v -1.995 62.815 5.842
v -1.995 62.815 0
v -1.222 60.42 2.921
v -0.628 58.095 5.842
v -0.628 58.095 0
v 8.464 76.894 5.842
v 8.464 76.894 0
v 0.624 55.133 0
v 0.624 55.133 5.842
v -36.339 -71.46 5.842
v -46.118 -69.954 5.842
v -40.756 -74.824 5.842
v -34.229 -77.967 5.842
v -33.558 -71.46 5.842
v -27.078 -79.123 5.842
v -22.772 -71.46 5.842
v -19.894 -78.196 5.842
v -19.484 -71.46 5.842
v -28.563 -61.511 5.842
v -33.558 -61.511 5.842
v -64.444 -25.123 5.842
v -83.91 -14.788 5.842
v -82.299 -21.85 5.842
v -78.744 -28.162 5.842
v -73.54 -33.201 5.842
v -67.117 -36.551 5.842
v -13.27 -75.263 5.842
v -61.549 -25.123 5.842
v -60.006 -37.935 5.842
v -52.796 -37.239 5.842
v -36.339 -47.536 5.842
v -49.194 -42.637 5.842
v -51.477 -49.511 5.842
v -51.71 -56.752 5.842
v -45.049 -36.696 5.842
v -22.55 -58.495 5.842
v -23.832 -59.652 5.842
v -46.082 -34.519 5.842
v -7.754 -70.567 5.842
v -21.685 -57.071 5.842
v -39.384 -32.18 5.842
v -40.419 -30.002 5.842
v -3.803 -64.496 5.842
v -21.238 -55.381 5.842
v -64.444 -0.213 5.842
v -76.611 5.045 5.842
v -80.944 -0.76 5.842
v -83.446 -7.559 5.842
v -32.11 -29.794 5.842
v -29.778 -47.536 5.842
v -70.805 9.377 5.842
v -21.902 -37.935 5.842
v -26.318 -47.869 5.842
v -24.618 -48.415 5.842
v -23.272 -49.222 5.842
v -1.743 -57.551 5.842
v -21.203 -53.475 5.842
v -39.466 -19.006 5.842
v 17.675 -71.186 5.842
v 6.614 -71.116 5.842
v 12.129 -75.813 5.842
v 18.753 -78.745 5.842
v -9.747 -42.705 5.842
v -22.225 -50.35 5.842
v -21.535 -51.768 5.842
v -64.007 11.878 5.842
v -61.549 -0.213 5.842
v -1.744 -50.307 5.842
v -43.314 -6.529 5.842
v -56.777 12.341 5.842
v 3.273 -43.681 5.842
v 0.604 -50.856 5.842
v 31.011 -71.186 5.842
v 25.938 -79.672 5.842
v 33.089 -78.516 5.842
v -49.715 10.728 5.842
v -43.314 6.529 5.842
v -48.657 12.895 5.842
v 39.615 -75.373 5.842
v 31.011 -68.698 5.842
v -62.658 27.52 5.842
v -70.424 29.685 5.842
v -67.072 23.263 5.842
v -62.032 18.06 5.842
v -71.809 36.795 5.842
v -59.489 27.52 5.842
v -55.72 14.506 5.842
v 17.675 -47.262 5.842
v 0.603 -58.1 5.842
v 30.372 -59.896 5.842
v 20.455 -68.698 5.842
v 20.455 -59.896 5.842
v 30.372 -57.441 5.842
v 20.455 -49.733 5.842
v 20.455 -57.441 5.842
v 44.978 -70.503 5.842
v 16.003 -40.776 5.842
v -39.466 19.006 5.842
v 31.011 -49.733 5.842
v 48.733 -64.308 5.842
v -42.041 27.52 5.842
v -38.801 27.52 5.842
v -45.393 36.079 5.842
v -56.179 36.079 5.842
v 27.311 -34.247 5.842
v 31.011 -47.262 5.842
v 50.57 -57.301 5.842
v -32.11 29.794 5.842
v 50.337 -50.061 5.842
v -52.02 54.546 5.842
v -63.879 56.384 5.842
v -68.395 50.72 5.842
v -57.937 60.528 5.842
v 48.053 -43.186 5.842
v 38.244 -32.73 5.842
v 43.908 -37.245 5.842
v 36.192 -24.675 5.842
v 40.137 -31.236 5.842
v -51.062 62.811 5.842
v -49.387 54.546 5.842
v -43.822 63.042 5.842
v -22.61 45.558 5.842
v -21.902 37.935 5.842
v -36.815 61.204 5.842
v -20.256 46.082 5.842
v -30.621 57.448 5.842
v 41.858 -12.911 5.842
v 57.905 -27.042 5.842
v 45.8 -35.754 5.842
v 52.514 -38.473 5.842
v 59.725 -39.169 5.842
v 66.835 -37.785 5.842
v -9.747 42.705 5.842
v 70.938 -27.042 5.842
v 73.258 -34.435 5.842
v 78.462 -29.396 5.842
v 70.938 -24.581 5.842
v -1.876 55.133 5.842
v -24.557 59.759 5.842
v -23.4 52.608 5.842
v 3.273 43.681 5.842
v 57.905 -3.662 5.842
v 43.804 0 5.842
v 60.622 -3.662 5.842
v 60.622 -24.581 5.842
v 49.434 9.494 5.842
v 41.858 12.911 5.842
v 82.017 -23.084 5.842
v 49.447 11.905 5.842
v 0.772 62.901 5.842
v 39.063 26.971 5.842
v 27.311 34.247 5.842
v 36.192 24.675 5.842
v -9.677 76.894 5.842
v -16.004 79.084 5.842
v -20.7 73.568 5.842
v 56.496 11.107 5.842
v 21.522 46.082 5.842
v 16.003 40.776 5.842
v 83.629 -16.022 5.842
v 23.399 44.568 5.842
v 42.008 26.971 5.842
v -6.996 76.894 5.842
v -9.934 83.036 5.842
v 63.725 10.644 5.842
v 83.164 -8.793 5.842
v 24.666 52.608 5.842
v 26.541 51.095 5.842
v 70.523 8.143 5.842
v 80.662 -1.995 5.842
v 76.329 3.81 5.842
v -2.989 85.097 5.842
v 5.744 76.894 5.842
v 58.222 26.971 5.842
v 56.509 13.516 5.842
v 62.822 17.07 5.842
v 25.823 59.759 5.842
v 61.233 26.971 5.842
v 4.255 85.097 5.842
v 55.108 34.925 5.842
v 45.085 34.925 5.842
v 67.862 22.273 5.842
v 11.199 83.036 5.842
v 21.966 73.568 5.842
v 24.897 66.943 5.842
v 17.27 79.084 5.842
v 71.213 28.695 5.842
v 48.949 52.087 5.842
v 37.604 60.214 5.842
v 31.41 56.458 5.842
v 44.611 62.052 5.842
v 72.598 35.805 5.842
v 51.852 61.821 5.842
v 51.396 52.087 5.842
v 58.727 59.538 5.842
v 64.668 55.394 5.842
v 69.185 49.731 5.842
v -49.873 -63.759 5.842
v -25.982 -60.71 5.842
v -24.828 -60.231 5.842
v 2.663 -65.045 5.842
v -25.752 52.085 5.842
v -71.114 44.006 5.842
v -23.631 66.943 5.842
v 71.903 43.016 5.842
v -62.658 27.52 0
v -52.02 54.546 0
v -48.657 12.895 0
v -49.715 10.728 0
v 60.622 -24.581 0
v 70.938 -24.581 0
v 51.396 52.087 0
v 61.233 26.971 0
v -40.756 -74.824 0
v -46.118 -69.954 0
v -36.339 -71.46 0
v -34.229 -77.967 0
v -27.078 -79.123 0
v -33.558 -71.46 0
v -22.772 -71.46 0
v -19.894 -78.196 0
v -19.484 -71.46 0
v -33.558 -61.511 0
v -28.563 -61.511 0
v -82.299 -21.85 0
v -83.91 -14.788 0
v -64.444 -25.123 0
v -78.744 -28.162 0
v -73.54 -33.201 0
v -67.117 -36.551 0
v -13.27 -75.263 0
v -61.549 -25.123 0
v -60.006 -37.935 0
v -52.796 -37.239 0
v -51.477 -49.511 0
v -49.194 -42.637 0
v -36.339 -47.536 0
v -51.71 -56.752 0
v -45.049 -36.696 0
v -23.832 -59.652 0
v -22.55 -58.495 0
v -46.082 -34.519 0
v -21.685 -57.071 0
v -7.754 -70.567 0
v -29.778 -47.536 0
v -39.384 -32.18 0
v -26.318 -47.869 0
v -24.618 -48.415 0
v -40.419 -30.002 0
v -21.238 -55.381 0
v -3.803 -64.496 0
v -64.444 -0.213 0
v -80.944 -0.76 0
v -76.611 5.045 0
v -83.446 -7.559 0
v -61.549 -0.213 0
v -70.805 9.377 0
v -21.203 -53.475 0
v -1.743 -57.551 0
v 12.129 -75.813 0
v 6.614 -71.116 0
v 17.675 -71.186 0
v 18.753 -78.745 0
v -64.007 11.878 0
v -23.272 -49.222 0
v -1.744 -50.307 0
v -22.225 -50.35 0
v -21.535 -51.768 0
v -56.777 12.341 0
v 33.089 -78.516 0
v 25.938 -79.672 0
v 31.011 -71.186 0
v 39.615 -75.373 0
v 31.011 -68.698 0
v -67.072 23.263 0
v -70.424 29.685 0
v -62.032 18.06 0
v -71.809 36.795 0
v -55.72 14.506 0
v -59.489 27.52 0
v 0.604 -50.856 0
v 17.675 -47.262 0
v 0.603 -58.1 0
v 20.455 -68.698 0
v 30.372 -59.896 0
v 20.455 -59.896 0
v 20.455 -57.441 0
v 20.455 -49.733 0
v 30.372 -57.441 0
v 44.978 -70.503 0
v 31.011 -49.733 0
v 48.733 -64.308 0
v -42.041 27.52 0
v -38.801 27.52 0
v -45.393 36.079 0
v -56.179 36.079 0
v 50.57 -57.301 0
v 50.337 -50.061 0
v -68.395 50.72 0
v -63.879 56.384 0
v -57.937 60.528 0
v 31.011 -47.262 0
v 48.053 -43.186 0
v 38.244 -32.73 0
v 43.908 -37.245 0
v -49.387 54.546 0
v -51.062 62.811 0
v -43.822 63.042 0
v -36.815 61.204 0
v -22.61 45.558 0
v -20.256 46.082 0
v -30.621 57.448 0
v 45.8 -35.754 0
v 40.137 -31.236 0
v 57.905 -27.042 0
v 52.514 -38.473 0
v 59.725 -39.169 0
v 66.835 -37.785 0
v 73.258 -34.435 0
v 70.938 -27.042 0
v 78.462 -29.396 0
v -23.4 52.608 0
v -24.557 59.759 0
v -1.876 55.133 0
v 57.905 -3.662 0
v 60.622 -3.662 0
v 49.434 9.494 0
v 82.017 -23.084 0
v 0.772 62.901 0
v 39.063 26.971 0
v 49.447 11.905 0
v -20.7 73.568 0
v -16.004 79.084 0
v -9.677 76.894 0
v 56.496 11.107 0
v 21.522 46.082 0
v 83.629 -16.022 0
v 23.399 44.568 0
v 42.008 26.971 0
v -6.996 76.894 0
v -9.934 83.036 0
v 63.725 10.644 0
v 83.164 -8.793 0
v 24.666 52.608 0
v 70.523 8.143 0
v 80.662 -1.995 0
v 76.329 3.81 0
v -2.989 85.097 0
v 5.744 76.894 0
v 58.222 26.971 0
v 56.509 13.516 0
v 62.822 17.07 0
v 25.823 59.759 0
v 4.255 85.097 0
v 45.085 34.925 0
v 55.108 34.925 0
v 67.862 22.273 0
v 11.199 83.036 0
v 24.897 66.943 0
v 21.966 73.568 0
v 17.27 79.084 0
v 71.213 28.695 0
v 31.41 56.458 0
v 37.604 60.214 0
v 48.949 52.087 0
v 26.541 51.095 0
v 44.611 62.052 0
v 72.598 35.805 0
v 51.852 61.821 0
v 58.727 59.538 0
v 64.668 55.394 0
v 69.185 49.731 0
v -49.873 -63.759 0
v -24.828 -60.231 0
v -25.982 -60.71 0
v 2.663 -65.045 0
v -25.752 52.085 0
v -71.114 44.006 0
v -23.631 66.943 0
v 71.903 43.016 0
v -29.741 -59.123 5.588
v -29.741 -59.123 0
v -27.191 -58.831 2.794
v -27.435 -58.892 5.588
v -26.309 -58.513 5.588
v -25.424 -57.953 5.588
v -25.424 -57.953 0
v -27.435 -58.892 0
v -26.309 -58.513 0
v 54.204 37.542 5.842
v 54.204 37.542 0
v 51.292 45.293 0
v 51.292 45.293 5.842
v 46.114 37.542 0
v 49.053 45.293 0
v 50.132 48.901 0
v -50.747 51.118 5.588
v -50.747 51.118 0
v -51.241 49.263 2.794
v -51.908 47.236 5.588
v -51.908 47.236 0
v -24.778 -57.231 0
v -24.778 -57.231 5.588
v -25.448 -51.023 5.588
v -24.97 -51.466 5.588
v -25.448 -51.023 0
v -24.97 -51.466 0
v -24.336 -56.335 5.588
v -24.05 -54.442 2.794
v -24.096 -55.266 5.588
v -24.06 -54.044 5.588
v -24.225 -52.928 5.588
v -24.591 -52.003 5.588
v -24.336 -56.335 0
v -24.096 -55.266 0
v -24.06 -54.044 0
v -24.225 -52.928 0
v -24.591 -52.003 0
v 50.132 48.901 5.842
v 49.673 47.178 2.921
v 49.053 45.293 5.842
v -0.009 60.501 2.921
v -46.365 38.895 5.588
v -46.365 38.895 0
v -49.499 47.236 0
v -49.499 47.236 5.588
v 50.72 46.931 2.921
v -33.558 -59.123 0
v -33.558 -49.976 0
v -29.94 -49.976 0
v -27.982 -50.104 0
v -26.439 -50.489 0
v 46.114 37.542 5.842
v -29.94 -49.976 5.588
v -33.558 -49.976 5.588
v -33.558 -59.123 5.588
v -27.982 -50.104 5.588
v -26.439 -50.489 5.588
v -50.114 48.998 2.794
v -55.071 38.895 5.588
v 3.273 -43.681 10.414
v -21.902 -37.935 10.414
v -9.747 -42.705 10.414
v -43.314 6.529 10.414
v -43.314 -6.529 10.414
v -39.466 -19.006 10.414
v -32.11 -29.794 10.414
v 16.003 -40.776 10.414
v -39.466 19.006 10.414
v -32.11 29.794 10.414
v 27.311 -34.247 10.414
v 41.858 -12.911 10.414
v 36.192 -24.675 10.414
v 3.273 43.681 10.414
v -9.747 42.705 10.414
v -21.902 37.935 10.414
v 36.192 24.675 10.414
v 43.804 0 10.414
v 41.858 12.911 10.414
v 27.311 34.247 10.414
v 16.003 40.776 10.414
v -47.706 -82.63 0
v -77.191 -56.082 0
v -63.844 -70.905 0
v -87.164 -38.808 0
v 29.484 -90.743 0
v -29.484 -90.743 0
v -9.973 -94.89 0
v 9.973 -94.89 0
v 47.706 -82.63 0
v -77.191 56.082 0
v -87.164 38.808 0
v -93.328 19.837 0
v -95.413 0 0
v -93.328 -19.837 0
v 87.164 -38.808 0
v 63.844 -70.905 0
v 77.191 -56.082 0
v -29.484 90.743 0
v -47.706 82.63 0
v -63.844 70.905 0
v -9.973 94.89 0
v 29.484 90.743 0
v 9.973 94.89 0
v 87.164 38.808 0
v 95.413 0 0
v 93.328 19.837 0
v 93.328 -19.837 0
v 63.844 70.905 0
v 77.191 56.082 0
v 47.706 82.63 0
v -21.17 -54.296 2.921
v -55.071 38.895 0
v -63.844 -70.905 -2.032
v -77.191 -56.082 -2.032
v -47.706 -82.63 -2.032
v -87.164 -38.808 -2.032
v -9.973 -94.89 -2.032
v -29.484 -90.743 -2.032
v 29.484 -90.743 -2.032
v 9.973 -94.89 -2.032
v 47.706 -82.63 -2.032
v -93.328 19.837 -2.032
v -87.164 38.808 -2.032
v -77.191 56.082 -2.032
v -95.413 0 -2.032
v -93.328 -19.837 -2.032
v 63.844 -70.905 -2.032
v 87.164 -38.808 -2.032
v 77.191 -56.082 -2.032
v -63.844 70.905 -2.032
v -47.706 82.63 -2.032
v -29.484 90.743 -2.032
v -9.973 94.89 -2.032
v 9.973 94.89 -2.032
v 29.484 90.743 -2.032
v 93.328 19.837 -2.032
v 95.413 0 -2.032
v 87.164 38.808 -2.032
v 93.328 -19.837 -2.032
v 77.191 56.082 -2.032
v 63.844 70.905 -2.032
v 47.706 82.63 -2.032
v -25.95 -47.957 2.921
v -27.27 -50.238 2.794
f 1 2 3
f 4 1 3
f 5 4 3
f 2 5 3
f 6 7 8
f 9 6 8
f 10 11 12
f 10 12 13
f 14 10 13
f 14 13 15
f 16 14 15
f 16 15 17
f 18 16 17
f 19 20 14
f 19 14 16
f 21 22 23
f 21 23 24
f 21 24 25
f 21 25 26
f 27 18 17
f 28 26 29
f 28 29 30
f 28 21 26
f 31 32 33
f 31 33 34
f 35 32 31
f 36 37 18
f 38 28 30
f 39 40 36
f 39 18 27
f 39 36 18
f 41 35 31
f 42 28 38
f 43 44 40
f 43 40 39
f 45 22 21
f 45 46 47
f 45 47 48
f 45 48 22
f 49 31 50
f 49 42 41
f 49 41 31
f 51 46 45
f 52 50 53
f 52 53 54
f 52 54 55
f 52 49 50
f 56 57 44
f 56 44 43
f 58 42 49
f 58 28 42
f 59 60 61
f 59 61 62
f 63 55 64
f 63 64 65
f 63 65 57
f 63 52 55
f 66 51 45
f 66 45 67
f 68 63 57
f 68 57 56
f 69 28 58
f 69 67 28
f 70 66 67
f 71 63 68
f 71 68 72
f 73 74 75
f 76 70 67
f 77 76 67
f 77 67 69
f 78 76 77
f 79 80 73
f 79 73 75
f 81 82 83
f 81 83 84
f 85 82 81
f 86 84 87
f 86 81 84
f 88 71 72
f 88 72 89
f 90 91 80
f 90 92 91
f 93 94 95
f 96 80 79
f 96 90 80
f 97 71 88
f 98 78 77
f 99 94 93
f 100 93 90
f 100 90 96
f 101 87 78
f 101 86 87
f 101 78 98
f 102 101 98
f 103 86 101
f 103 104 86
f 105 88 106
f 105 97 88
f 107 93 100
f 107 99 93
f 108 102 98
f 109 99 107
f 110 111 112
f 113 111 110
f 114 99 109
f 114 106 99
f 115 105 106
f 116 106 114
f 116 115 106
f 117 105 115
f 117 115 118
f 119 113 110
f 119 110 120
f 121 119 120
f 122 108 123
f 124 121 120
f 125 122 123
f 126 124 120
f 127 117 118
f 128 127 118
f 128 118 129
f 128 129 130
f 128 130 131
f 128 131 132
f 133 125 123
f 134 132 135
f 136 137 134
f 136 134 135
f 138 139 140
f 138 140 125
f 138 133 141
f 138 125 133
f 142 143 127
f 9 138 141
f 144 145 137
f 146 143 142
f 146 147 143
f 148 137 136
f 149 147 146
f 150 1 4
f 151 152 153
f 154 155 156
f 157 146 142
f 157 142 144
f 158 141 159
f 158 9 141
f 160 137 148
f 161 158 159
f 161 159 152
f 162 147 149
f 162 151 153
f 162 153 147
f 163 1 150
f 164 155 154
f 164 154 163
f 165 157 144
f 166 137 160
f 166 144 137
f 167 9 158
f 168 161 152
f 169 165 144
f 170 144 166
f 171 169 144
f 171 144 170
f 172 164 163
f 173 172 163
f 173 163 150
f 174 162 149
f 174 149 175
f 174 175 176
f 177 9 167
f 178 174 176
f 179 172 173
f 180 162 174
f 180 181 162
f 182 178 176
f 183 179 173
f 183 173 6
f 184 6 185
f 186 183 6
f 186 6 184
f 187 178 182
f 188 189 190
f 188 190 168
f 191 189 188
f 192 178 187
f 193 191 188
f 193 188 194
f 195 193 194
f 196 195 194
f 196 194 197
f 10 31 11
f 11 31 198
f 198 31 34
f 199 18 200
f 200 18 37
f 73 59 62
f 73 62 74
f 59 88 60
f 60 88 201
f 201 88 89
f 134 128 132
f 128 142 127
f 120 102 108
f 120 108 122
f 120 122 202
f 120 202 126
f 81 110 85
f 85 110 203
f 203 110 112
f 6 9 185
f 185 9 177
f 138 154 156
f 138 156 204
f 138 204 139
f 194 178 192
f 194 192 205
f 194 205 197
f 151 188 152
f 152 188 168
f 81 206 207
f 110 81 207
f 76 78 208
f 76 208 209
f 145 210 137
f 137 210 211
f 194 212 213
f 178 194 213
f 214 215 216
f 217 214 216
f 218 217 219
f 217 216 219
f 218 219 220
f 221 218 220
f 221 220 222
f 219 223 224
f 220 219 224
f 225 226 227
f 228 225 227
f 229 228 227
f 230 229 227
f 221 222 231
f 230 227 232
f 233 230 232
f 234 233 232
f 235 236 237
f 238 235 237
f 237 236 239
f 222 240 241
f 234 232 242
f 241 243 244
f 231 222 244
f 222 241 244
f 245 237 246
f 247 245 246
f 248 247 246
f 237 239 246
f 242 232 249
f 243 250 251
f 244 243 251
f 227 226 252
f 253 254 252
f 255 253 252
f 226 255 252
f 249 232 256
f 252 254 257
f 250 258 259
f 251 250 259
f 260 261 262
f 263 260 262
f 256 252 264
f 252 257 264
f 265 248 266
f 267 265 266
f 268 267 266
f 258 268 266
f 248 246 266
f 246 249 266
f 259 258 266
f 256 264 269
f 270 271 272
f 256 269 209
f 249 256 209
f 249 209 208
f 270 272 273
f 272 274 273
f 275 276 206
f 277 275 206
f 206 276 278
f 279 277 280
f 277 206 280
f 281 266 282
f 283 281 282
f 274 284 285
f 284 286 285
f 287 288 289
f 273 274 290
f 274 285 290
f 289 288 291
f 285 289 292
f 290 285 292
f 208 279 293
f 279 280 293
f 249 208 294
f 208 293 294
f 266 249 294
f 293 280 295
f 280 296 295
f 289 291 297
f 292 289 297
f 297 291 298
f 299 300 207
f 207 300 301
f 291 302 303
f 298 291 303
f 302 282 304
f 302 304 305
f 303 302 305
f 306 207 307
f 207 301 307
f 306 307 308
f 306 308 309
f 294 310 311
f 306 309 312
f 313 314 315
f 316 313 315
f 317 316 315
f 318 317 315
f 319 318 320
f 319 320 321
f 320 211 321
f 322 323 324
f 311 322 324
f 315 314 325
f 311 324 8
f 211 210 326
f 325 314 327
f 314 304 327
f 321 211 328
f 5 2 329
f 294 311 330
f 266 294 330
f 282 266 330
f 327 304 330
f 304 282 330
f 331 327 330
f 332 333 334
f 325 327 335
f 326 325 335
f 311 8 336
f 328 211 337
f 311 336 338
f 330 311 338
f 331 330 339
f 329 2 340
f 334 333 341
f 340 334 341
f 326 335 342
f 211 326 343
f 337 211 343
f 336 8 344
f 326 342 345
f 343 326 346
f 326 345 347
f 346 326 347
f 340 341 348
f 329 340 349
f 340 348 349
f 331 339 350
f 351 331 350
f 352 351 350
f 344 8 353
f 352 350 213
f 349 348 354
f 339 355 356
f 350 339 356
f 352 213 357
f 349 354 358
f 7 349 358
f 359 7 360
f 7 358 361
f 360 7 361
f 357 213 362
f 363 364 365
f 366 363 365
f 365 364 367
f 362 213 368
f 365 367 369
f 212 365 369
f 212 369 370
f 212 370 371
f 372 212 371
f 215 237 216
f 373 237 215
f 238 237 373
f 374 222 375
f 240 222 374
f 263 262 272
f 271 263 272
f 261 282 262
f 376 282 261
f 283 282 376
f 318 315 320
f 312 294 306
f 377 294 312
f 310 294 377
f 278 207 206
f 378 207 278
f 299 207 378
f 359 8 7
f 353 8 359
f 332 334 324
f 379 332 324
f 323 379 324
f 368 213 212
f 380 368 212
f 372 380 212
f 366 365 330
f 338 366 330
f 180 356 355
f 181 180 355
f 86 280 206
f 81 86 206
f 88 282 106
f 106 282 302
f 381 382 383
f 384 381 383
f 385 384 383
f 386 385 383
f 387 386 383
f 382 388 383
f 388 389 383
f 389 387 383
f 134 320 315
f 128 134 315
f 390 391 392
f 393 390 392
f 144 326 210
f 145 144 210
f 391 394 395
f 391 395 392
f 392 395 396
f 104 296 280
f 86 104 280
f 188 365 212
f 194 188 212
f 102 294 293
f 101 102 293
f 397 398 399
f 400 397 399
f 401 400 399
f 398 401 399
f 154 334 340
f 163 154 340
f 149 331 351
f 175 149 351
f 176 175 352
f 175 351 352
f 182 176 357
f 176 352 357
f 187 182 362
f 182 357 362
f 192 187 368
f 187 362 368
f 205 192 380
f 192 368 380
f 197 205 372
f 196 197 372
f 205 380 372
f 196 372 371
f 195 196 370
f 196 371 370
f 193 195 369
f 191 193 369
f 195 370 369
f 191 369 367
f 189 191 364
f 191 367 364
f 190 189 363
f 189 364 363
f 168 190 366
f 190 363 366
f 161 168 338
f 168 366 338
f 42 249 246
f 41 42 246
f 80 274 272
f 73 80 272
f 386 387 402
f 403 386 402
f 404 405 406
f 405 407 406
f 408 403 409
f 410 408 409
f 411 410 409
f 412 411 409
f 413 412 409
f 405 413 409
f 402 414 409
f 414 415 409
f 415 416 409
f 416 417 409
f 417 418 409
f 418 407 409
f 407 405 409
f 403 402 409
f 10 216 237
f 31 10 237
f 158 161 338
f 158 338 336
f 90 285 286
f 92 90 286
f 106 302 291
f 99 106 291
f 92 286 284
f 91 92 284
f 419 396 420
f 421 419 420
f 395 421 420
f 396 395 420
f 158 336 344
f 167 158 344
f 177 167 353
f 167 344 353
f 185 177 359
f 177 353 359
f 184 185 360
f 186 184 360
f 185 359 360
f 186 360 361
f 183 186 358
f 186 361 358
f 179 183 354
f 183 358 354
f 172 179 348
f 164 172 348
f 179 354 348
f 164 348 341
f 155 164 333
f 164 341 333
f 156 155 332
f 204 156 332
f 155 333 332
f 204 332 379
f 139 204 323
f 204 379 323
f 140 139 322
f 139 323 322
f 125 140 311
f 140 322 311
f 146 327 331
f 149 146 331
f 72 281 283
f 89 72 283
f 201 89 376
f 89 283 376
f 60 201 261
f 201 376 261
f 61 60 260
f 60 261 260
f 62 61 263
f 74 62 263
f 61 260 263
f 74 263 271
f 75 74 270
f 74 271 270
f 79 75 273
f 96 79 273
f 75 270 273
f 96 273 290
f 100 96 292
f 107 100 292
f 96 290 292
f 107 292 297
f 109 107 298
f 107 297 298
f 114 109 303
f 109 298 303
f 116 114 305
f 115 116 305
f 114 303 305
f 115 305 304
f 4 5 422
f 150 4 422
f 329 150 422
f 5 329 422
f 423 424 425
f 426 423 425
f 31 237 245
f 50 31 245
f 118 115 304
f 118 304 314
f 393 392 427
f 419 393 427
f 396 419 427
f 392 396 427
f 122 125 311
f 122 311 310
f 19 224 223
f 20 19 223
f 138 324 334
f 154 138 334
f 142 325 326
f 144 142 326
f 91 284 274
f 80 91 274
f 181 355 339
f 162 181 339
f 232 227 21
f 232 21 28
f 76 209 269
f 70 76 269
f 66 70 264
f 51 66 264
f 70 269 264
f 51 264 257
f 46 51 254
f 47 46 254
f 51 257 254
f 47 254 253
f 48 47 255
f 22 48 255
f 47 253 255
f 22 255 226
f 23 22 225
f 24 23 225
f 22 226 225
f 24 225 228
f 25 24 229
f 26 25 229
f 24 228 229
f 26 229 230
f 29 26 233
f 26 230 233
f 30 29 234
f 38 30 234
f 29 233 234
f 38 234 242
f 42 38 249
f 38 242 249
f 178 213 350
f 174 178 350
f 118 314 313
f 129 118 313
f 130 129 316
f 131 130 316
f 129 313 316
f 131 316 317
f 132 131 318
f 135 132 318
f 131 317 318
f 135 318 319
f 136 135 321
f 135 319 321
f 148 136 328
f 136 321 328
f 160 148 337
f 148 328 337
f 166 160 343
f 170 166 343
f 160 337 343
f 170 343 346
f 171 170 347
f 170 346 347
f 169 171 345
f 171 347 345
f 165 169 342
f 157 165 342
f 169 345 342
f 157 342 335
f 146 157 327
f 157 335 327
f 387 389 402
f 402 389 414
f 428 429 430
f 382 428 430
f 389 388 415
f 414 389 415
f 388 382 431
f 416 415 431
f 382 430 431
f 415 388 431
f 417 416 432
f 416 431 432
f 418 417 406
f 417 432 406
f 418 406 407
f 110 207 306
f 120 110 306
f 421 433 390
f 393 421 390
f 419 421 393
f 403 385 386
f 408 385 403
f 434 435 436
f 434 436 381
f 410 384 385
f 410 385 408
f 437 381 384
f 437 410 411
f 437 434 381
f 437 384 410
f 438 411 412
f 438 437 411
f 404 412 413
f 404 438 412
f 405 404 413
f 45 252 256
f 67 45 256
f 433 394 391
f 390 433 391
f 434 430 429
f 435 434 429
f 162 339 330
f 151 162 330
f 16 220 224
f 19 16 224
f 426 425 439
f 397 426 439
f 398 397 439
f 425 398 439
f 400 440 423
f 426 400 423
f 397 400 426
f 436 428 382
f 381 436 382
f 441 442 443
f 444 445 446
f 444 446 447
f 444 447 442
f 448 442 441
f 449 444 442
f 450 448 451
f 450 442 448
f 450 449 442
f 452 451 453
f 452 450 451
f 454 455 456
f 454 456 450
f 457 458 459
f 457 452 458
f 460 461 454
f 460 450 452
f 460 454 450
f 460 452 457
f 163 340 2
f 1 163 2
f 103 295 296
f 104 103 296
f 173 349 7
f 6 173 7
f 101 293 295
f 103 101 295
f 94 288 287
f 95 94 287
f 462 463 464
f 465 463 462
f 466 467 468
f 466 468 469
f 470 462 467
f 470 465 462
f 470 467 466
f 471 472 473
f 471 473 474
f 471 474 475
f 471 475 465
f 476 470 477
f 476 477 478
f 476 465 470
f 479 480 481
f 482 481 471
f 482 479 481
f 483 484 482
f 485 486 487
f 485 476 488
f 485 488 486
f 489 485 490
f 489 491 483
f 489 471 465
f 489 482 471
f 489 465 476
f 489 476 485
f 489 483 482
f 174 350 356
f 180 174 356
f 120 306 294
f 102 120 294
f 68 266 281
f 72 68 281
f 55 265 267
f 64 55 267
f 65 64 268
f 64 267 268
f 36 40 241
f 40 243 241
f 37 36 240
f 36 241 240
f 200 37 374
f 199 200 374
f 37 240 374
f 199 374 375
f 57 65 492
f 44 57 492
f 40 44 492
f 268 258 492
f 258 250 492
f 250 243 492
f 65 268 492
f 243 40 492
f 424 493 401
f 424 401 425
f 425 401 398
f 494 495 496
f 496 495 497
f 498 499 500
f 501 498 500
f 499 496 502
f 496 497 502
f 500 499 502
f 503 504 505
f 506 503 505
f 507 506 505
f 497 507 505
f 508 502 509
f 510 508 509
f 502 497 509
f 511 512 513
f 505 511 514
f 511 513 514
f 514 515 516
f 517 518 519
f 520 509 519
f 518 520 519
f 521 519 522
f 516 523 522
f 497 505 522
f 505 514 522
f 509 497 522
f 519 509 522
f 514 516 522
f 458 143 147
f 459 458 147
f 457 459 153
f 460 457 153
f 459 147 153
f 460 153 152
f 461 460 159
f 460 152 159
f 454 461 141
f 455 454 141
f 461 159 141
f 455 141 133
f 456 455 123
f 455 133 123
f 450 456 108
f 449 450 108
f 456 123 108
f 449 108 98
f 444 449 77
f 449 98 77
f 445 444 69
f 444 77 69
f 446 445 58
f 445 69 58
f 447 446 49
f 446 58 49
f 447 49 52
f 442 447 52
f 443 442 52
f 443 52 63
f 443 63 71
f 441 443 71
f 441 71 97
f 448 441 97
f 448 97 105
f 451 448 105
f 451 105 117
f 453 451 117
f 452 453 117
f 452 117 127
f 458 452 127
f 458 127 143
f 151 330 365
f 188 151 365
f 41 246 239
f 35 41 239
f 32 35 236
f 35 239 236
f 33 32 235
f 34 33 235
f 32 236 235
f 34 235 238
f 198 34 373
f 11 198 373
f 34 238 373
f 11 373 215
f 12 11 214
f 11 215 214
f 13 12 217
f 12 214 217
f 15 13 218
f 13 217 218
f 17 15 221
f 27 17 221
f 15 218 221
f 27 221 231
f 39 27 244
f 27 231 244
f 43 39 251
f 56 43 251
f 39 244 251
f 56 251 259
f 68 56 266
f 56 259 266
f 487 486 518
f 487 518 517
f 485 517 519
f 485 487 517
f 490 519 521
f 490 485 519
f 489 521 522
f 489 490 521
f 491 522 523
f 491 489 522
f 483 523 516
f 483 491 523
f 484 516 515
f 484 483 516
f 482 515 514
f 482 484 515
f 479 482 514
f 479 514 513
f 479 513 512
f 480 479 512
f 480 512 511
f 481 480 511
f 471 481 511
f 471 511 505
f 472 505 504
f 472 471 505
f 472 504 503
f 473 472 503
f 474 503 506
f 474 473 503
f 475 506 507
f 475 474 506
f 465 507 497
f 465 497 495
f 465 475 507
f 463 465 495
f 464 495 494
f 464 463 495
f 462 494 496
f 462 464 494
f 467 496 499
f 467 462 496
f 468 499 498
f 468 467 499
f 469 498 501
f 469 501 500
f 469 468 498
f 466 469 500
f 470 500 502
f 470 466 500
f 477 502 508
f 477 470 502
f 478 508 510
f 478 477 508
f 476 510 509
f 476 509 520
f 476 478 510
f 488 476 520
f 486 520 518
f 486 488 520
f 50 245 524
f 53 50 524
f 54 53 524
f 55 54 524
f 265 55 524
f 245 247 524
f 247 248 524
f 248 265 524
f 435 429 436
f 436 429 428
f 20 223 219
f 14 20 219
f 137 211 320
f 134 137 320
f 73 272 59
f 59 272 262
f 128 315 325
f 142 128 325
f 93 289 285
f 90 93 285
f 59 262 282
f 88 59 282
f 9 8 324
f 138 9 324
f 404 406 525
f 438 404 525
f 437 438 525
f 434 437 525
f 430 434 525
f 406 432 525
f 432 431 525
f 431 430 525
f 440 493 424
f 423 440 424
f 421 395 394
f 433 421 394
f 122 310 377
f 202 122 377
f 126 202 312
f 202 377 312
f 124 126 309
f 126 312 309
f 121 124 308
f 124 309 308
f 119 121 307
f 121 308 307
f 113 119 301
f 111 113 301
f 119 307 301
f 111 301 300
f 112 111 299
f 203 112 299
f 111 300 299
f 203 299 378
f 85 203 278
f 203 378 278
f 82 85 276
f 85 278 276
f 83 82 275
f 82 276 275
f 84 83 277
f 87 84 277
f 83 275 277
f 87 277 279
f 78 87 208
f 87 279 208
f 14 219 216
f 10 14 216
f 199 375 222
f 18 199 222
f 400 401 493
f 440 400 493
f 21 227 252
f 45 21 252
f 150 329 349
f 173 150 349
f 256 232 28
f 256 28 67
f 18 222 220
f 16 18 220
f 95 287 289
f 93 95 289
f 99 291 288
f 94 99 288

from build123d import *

# Parameters (mm, degrees)
F0_R     = 43.8036785808
F1_DEPTH = 10.414
F0_W     = 2.8950411615
F0_H     = 24.910438921
F2_DEPTH = 5.842
F3_DEPTH = 5.588
F4_R     = 95.4127414117
F5_DEPTH = 2.032


with BuildPart() as f1:
    # F0 (on Top) → F1 (new body)
    with BuildSketch(Plane.XY):
        Circle(F0_R)
    extrude(amount=F1_DEPTH)

    # F0 (on Top) → F2 (join)
    with BuildSketch(Plane.XY):
        with BuildLine():
            Line((23.3989122151, 44.5680174699), (21.5216763318, 46.0817106068))
            ThreePointArc((21.5216763318, 46.0817106068), (0.6329901516, 85.3589574882), (-20.2556960285, 46.0817106068))
            Line((-20.2556960285, 46.0817106068), (-22.6095864066, 45.5578007272))
            ThreePointArc((-22.6095864066, 45.5578007272), (-66.3416573707, 53.7153311199), (-48.6573520217, 12.8949357612))
            Line((-48.6573520217, 12.8949357612), (-49.7153694293, 10.7279376902))
            ThreePointArc((-49.7153694293, 10.7279376902), (-83.3596837697, -18.3770351748), (-40.4190295135, -30.0019887214))
            Line((-40.4190295135, -30.0019887214), (-39.384465263, -32.1802812375))
            ThreePointArc((-39.384465263, -32.1802812375), (-37.6061680625, -76.6311191597), (-1.7443533837, -50.3068037677))
            Line((-1.7443533837, -50.3068037677), (0.603744543, -50.8560920353))
            ThreePointArc((0.603744543, -50.8560920353), (36.4655592218, -77.1804074273), (38.2438564224, -32.7295695052))
            Line((38.2438564224, -32.7295695052), (40.137322394, -31.2362282553))
            ThreePointArc((40.137322394, -31.2362282553), (83.0779766503, -19.6112747088), (49.4336623099, 9.4936981563))
            Line((49.4336623099, 9.4936981563), (49.4466778301, 11.9051525039))
            ThreePointArc((49.4466778301, 11.9051525039), (67.1309831792, 52.7255478626), (23.3989122151, 44.5680174699))
        make_face()
        with BuildLine():
            Line((-28.5631664511, -61.511123346), (-33.5584082123, -61.511123346))
            Line((-33.5584082123, -61.511123346), (-33.5584082123, -71.4597180486))
            Line((-33.5584082123, -71.4597180486), (-36.3387786266, -71.4597180486))
            Line((-36.3387786266, -71.4597180486), (-36.3387786266, -47.53596584))
            Line((-36.3387786266, -47.53596584), (-29.7779422253, -47.53596584))
            add(Edge.make_bspline(
                [(-29.7779422253, -47.53596584), (-25.3743800438, -47.53596584), (-23.2720849001, -49.221990837)],
                knots=[0, 0, 0, 1, 1, 1], degree=2))
            add(Edge.make_bspline(
                [(-23.2720849001, -49.221990837), (-21.1697897563, -50.908015834), (-21.1697897563, -54.2957741353)],
                knots=[0, 0, 0, 1, 1, 1], degree=2))
            add(Edge.make_bspline(
                [(-21.1697897563, -54.2957741353), (-21.1697897563, -59.0396829777), (-25.9817679309, -60.7099996673)],
                knots=[0, 0, 0, 1, 1, 1], degree=2))
            Line((-25.9817679309, -60.7099996673), (-19.4837647594, -71.4597180486))
            Line((-19.4837647594, -71.4597180486), (-22.7720371137, -71.4597180486))
            Line((-22.7720371137, -71.4597180486), (-28.5631664511, -61.511123346))
        make_face(mode=Mode.SUBTRACT)
        with Locations((-62.9963150182, -12.6678496023)):
            Rectangle(F0_W, F0_H, mode=Mode.SUBTRACT)
        Polygon((31.0112974079, -68.6983813244), (31.0112974079, -71.185529232), (17.6749485221, -71.185529232), (17.6749485221, -47.261784411), (31.0112974079, -47.261784411), (31.0112974079, -49.7332240161), (20.4553180778, -49.7332240161), (20.4553180778, -57.4407644793), (30.3724931032, -57.4407644793), (30.3724931032, -59.8964957818), (20.4553180778, -59.8964957818), (20.4553180778, -68.6983813244), align=None, mode=Mode.SUBTRACT)
        Circle(F0_R, mode=Mode.SUBTRACT)
        Polygon((70.9381277669, -27.042336762), (57.9048754965, -27.042336762), (57.9048754965, -3.6623094265), (60.6220552985, -3.6623094265), (60.6220552985, -24.5810119319), (70.9381277669, -24.5810119319), align=None, mode=Mode.SUBTRACT)
        Polygon((-38.8012931435, 27.5197494775), (-42.041130883, 27.5197494775), (-45.3928902898, 36.0788117238), (-56.1786046552, 36.0788117238), (-59.4891297636, 27.5197494775), (-62.6582801342, 27.5197494775), (-52.0198311206, 54.5458868388), (-49.3867266305, 54.5458868388), align=None, mode=Mode.SUBTRACT)
        with BuildLine():
            Line((0.7720730743, 62.9007027286), (5.744391349, 76.8936827008))
            Line((5.744391349, 76.8936827008), (8.4639255777, 76.8936827008))
            Line((8.4639255777, 76.8936827008), (0.6244276083, 55.1326461136))
            Line((0.6244276083, 55.1326461136), (-1.8760198, 55.1326461136))
            Line((-1.8760198, 55.1326461136), (-9.6774157137, 76.8936827008))
            Line((-9.6774157137, 76.8936827008), (-6.9959835406, 76.8936827008))
            Line((-6.9959835406, 76.8936827008), (-1.9950887242, 62.8149731031))
            add(Edge.make_bspline(
                [(-1.9950887242, 62.8149731031), (-1.1330297129, 60.3859670494), (-0.6281774743, 58.0950809478)],
                knots=[0, 0, 0, 1, 1, 1], degree=2))
            add(Edge.make_bspline(
                [(-0.6281774743, 58.0950809478), (-0.0899859369, 60.5050359736), (0.7720730743, 62.9007027286)],
                knots=[0, 0, 0, 1, 1, 1], degree=2))
        make_face(mode=Mode.SUBTRACT)
        Polygon((61.2331293523, 26.9713848829), (58.2223704292, 26.9713848829), (55.1076034705, 34.9252625472), (45.0845133099, 34.9252625472), (42.0080651012, 26.9713848829), (39.0629954636, 26.9713848829), (48.9492329458, 52.0865884092), (51.3961588343, 52.0865884092), align=None, mode=Mode.SUBTRACT)
    extrude(amount=F2_DEPTH)


with BuildPart() as f2:
    # F0 (on Top) → F2, piece 2 (new body)
    with BuildSketch(Plane.XY):
        with BuildLine():
            Line((46.1136454509, 37.5418857568), (54.2043757935, 37.5418857568))
            Line((54.2043757935, 37.5418857568), (51.2921507988, 45.2932214571))
            add(Edge.make_bspline(
                [(51.2921507988, 45.2932214571), (50.7283177641, 46.7657562759), (50.1316400866, 48.9006580578)],
                knots=[0, 0, 0, 1, 1, 1], degree=2))
            add(Edge.make_bspline(
                [(50.1316400866, 48.9006580578), (49.7539266944, 47.2584259179), (49.0532409814, 45.2932214571)],
                knots=[0, 0, 0, 1, 1, 1], degree=2))
            Line((49.0532409814, 45.2932214571), (46.1136454509, 37.5418857568))
        make_face()
    extrude(amount=F2_DEPTH)


with BuildPart() as f3:
    # F0 (on Top) → F3 (new body)
    with BuildSketch(Plane.XY):
        with BuildLine():
            Line((-33.5584082123, -49.9759895934), (-33.5584082123, -59.1234606173))
            Line((-33.5584082123, -59.1234606173), (-29.741289508, -59.1234606173))
            add(Edge.make_bspline(
                [(-29.741289508, -59.1234606173), (-26.798599917, -59.1234606173), (-25.4241230173, -57.9531917142)],
                knots=[0, 0, 0, 1, 1, 1], degree=2))
            add(Edge.make_bspline(
                [(-25.4241230173, -57.9531917142), (-24.0496461176, -56.782922811), (-24.0496461176, -54.4423850046)],
                knots=[0, 0, 0, 1, 1, 1], degree=2))
            add(Edge.make_bspline(
                [(-24.0496461176, -54.4423850046), (-24.0496461176, -52.0704305834), (-25.4476854785, -51.0232100884)],
                knots=[0, 0, 0, 1, 1, 1], degree=2))
            add(Edge.make_bspline(
                [(-25.4476854785, -51.0232100884), (-26.8457248393, -49.9759895934), (-29.9402614021, -49.9759895934)],
                knots=[0, 0, 0, 1, 1, 1], degree=2))
            Line((-29.9402614021, -49.9759895934), (-33.5584082123, -49.9759895934))
        make_face()
    extrude(amount=F3_DEPTH)


with BuildPart() as f3b:
    # F0 (on Top) → F3, piece 2 (new body)
    with BuildSketch(Plane.XY):
        with BuildLine():
            Line((-55.0711692097, 38.8945252501), (-46.3648416116, 38.8945252501))
            Line((-46.3648416116, 38.8945252501), (-49.4986482978, 47.2356347758))
            add(Edge.make_bspline(
                [(-49.4986482978, 47.2356347758), (-50.1053815472, 48.8202099611), (-50.7474584811, 51.1175494491)],
                knots=[0, 0, 0, 1, 1, 1], degree=2))
            add(Edge.make_bspline(
                [(-50.7474584811, 51.1175494491), (-51.153910852, 49.3503652275), (-51.9079094532, 47.2356347758)],
                knots=[0, 0, 0, 1, 1, 1], degree=2))
            Line((-51.9079094532, 47.2356347758), (-55.0711692097, 38.8945252501))
        make_face()
    extrude(amount=F3_DEPTH)


with BuildPart() as f5:
    # F4 (on Top) → F5 (new body)
    with BuildSketch(Plane.XY):
        Circle(F4_R)
    extrude(amount=-F5_DEPTH)


solid = Compound([f1.part, f2.part, f3.part, f3b.part, f5.part])
